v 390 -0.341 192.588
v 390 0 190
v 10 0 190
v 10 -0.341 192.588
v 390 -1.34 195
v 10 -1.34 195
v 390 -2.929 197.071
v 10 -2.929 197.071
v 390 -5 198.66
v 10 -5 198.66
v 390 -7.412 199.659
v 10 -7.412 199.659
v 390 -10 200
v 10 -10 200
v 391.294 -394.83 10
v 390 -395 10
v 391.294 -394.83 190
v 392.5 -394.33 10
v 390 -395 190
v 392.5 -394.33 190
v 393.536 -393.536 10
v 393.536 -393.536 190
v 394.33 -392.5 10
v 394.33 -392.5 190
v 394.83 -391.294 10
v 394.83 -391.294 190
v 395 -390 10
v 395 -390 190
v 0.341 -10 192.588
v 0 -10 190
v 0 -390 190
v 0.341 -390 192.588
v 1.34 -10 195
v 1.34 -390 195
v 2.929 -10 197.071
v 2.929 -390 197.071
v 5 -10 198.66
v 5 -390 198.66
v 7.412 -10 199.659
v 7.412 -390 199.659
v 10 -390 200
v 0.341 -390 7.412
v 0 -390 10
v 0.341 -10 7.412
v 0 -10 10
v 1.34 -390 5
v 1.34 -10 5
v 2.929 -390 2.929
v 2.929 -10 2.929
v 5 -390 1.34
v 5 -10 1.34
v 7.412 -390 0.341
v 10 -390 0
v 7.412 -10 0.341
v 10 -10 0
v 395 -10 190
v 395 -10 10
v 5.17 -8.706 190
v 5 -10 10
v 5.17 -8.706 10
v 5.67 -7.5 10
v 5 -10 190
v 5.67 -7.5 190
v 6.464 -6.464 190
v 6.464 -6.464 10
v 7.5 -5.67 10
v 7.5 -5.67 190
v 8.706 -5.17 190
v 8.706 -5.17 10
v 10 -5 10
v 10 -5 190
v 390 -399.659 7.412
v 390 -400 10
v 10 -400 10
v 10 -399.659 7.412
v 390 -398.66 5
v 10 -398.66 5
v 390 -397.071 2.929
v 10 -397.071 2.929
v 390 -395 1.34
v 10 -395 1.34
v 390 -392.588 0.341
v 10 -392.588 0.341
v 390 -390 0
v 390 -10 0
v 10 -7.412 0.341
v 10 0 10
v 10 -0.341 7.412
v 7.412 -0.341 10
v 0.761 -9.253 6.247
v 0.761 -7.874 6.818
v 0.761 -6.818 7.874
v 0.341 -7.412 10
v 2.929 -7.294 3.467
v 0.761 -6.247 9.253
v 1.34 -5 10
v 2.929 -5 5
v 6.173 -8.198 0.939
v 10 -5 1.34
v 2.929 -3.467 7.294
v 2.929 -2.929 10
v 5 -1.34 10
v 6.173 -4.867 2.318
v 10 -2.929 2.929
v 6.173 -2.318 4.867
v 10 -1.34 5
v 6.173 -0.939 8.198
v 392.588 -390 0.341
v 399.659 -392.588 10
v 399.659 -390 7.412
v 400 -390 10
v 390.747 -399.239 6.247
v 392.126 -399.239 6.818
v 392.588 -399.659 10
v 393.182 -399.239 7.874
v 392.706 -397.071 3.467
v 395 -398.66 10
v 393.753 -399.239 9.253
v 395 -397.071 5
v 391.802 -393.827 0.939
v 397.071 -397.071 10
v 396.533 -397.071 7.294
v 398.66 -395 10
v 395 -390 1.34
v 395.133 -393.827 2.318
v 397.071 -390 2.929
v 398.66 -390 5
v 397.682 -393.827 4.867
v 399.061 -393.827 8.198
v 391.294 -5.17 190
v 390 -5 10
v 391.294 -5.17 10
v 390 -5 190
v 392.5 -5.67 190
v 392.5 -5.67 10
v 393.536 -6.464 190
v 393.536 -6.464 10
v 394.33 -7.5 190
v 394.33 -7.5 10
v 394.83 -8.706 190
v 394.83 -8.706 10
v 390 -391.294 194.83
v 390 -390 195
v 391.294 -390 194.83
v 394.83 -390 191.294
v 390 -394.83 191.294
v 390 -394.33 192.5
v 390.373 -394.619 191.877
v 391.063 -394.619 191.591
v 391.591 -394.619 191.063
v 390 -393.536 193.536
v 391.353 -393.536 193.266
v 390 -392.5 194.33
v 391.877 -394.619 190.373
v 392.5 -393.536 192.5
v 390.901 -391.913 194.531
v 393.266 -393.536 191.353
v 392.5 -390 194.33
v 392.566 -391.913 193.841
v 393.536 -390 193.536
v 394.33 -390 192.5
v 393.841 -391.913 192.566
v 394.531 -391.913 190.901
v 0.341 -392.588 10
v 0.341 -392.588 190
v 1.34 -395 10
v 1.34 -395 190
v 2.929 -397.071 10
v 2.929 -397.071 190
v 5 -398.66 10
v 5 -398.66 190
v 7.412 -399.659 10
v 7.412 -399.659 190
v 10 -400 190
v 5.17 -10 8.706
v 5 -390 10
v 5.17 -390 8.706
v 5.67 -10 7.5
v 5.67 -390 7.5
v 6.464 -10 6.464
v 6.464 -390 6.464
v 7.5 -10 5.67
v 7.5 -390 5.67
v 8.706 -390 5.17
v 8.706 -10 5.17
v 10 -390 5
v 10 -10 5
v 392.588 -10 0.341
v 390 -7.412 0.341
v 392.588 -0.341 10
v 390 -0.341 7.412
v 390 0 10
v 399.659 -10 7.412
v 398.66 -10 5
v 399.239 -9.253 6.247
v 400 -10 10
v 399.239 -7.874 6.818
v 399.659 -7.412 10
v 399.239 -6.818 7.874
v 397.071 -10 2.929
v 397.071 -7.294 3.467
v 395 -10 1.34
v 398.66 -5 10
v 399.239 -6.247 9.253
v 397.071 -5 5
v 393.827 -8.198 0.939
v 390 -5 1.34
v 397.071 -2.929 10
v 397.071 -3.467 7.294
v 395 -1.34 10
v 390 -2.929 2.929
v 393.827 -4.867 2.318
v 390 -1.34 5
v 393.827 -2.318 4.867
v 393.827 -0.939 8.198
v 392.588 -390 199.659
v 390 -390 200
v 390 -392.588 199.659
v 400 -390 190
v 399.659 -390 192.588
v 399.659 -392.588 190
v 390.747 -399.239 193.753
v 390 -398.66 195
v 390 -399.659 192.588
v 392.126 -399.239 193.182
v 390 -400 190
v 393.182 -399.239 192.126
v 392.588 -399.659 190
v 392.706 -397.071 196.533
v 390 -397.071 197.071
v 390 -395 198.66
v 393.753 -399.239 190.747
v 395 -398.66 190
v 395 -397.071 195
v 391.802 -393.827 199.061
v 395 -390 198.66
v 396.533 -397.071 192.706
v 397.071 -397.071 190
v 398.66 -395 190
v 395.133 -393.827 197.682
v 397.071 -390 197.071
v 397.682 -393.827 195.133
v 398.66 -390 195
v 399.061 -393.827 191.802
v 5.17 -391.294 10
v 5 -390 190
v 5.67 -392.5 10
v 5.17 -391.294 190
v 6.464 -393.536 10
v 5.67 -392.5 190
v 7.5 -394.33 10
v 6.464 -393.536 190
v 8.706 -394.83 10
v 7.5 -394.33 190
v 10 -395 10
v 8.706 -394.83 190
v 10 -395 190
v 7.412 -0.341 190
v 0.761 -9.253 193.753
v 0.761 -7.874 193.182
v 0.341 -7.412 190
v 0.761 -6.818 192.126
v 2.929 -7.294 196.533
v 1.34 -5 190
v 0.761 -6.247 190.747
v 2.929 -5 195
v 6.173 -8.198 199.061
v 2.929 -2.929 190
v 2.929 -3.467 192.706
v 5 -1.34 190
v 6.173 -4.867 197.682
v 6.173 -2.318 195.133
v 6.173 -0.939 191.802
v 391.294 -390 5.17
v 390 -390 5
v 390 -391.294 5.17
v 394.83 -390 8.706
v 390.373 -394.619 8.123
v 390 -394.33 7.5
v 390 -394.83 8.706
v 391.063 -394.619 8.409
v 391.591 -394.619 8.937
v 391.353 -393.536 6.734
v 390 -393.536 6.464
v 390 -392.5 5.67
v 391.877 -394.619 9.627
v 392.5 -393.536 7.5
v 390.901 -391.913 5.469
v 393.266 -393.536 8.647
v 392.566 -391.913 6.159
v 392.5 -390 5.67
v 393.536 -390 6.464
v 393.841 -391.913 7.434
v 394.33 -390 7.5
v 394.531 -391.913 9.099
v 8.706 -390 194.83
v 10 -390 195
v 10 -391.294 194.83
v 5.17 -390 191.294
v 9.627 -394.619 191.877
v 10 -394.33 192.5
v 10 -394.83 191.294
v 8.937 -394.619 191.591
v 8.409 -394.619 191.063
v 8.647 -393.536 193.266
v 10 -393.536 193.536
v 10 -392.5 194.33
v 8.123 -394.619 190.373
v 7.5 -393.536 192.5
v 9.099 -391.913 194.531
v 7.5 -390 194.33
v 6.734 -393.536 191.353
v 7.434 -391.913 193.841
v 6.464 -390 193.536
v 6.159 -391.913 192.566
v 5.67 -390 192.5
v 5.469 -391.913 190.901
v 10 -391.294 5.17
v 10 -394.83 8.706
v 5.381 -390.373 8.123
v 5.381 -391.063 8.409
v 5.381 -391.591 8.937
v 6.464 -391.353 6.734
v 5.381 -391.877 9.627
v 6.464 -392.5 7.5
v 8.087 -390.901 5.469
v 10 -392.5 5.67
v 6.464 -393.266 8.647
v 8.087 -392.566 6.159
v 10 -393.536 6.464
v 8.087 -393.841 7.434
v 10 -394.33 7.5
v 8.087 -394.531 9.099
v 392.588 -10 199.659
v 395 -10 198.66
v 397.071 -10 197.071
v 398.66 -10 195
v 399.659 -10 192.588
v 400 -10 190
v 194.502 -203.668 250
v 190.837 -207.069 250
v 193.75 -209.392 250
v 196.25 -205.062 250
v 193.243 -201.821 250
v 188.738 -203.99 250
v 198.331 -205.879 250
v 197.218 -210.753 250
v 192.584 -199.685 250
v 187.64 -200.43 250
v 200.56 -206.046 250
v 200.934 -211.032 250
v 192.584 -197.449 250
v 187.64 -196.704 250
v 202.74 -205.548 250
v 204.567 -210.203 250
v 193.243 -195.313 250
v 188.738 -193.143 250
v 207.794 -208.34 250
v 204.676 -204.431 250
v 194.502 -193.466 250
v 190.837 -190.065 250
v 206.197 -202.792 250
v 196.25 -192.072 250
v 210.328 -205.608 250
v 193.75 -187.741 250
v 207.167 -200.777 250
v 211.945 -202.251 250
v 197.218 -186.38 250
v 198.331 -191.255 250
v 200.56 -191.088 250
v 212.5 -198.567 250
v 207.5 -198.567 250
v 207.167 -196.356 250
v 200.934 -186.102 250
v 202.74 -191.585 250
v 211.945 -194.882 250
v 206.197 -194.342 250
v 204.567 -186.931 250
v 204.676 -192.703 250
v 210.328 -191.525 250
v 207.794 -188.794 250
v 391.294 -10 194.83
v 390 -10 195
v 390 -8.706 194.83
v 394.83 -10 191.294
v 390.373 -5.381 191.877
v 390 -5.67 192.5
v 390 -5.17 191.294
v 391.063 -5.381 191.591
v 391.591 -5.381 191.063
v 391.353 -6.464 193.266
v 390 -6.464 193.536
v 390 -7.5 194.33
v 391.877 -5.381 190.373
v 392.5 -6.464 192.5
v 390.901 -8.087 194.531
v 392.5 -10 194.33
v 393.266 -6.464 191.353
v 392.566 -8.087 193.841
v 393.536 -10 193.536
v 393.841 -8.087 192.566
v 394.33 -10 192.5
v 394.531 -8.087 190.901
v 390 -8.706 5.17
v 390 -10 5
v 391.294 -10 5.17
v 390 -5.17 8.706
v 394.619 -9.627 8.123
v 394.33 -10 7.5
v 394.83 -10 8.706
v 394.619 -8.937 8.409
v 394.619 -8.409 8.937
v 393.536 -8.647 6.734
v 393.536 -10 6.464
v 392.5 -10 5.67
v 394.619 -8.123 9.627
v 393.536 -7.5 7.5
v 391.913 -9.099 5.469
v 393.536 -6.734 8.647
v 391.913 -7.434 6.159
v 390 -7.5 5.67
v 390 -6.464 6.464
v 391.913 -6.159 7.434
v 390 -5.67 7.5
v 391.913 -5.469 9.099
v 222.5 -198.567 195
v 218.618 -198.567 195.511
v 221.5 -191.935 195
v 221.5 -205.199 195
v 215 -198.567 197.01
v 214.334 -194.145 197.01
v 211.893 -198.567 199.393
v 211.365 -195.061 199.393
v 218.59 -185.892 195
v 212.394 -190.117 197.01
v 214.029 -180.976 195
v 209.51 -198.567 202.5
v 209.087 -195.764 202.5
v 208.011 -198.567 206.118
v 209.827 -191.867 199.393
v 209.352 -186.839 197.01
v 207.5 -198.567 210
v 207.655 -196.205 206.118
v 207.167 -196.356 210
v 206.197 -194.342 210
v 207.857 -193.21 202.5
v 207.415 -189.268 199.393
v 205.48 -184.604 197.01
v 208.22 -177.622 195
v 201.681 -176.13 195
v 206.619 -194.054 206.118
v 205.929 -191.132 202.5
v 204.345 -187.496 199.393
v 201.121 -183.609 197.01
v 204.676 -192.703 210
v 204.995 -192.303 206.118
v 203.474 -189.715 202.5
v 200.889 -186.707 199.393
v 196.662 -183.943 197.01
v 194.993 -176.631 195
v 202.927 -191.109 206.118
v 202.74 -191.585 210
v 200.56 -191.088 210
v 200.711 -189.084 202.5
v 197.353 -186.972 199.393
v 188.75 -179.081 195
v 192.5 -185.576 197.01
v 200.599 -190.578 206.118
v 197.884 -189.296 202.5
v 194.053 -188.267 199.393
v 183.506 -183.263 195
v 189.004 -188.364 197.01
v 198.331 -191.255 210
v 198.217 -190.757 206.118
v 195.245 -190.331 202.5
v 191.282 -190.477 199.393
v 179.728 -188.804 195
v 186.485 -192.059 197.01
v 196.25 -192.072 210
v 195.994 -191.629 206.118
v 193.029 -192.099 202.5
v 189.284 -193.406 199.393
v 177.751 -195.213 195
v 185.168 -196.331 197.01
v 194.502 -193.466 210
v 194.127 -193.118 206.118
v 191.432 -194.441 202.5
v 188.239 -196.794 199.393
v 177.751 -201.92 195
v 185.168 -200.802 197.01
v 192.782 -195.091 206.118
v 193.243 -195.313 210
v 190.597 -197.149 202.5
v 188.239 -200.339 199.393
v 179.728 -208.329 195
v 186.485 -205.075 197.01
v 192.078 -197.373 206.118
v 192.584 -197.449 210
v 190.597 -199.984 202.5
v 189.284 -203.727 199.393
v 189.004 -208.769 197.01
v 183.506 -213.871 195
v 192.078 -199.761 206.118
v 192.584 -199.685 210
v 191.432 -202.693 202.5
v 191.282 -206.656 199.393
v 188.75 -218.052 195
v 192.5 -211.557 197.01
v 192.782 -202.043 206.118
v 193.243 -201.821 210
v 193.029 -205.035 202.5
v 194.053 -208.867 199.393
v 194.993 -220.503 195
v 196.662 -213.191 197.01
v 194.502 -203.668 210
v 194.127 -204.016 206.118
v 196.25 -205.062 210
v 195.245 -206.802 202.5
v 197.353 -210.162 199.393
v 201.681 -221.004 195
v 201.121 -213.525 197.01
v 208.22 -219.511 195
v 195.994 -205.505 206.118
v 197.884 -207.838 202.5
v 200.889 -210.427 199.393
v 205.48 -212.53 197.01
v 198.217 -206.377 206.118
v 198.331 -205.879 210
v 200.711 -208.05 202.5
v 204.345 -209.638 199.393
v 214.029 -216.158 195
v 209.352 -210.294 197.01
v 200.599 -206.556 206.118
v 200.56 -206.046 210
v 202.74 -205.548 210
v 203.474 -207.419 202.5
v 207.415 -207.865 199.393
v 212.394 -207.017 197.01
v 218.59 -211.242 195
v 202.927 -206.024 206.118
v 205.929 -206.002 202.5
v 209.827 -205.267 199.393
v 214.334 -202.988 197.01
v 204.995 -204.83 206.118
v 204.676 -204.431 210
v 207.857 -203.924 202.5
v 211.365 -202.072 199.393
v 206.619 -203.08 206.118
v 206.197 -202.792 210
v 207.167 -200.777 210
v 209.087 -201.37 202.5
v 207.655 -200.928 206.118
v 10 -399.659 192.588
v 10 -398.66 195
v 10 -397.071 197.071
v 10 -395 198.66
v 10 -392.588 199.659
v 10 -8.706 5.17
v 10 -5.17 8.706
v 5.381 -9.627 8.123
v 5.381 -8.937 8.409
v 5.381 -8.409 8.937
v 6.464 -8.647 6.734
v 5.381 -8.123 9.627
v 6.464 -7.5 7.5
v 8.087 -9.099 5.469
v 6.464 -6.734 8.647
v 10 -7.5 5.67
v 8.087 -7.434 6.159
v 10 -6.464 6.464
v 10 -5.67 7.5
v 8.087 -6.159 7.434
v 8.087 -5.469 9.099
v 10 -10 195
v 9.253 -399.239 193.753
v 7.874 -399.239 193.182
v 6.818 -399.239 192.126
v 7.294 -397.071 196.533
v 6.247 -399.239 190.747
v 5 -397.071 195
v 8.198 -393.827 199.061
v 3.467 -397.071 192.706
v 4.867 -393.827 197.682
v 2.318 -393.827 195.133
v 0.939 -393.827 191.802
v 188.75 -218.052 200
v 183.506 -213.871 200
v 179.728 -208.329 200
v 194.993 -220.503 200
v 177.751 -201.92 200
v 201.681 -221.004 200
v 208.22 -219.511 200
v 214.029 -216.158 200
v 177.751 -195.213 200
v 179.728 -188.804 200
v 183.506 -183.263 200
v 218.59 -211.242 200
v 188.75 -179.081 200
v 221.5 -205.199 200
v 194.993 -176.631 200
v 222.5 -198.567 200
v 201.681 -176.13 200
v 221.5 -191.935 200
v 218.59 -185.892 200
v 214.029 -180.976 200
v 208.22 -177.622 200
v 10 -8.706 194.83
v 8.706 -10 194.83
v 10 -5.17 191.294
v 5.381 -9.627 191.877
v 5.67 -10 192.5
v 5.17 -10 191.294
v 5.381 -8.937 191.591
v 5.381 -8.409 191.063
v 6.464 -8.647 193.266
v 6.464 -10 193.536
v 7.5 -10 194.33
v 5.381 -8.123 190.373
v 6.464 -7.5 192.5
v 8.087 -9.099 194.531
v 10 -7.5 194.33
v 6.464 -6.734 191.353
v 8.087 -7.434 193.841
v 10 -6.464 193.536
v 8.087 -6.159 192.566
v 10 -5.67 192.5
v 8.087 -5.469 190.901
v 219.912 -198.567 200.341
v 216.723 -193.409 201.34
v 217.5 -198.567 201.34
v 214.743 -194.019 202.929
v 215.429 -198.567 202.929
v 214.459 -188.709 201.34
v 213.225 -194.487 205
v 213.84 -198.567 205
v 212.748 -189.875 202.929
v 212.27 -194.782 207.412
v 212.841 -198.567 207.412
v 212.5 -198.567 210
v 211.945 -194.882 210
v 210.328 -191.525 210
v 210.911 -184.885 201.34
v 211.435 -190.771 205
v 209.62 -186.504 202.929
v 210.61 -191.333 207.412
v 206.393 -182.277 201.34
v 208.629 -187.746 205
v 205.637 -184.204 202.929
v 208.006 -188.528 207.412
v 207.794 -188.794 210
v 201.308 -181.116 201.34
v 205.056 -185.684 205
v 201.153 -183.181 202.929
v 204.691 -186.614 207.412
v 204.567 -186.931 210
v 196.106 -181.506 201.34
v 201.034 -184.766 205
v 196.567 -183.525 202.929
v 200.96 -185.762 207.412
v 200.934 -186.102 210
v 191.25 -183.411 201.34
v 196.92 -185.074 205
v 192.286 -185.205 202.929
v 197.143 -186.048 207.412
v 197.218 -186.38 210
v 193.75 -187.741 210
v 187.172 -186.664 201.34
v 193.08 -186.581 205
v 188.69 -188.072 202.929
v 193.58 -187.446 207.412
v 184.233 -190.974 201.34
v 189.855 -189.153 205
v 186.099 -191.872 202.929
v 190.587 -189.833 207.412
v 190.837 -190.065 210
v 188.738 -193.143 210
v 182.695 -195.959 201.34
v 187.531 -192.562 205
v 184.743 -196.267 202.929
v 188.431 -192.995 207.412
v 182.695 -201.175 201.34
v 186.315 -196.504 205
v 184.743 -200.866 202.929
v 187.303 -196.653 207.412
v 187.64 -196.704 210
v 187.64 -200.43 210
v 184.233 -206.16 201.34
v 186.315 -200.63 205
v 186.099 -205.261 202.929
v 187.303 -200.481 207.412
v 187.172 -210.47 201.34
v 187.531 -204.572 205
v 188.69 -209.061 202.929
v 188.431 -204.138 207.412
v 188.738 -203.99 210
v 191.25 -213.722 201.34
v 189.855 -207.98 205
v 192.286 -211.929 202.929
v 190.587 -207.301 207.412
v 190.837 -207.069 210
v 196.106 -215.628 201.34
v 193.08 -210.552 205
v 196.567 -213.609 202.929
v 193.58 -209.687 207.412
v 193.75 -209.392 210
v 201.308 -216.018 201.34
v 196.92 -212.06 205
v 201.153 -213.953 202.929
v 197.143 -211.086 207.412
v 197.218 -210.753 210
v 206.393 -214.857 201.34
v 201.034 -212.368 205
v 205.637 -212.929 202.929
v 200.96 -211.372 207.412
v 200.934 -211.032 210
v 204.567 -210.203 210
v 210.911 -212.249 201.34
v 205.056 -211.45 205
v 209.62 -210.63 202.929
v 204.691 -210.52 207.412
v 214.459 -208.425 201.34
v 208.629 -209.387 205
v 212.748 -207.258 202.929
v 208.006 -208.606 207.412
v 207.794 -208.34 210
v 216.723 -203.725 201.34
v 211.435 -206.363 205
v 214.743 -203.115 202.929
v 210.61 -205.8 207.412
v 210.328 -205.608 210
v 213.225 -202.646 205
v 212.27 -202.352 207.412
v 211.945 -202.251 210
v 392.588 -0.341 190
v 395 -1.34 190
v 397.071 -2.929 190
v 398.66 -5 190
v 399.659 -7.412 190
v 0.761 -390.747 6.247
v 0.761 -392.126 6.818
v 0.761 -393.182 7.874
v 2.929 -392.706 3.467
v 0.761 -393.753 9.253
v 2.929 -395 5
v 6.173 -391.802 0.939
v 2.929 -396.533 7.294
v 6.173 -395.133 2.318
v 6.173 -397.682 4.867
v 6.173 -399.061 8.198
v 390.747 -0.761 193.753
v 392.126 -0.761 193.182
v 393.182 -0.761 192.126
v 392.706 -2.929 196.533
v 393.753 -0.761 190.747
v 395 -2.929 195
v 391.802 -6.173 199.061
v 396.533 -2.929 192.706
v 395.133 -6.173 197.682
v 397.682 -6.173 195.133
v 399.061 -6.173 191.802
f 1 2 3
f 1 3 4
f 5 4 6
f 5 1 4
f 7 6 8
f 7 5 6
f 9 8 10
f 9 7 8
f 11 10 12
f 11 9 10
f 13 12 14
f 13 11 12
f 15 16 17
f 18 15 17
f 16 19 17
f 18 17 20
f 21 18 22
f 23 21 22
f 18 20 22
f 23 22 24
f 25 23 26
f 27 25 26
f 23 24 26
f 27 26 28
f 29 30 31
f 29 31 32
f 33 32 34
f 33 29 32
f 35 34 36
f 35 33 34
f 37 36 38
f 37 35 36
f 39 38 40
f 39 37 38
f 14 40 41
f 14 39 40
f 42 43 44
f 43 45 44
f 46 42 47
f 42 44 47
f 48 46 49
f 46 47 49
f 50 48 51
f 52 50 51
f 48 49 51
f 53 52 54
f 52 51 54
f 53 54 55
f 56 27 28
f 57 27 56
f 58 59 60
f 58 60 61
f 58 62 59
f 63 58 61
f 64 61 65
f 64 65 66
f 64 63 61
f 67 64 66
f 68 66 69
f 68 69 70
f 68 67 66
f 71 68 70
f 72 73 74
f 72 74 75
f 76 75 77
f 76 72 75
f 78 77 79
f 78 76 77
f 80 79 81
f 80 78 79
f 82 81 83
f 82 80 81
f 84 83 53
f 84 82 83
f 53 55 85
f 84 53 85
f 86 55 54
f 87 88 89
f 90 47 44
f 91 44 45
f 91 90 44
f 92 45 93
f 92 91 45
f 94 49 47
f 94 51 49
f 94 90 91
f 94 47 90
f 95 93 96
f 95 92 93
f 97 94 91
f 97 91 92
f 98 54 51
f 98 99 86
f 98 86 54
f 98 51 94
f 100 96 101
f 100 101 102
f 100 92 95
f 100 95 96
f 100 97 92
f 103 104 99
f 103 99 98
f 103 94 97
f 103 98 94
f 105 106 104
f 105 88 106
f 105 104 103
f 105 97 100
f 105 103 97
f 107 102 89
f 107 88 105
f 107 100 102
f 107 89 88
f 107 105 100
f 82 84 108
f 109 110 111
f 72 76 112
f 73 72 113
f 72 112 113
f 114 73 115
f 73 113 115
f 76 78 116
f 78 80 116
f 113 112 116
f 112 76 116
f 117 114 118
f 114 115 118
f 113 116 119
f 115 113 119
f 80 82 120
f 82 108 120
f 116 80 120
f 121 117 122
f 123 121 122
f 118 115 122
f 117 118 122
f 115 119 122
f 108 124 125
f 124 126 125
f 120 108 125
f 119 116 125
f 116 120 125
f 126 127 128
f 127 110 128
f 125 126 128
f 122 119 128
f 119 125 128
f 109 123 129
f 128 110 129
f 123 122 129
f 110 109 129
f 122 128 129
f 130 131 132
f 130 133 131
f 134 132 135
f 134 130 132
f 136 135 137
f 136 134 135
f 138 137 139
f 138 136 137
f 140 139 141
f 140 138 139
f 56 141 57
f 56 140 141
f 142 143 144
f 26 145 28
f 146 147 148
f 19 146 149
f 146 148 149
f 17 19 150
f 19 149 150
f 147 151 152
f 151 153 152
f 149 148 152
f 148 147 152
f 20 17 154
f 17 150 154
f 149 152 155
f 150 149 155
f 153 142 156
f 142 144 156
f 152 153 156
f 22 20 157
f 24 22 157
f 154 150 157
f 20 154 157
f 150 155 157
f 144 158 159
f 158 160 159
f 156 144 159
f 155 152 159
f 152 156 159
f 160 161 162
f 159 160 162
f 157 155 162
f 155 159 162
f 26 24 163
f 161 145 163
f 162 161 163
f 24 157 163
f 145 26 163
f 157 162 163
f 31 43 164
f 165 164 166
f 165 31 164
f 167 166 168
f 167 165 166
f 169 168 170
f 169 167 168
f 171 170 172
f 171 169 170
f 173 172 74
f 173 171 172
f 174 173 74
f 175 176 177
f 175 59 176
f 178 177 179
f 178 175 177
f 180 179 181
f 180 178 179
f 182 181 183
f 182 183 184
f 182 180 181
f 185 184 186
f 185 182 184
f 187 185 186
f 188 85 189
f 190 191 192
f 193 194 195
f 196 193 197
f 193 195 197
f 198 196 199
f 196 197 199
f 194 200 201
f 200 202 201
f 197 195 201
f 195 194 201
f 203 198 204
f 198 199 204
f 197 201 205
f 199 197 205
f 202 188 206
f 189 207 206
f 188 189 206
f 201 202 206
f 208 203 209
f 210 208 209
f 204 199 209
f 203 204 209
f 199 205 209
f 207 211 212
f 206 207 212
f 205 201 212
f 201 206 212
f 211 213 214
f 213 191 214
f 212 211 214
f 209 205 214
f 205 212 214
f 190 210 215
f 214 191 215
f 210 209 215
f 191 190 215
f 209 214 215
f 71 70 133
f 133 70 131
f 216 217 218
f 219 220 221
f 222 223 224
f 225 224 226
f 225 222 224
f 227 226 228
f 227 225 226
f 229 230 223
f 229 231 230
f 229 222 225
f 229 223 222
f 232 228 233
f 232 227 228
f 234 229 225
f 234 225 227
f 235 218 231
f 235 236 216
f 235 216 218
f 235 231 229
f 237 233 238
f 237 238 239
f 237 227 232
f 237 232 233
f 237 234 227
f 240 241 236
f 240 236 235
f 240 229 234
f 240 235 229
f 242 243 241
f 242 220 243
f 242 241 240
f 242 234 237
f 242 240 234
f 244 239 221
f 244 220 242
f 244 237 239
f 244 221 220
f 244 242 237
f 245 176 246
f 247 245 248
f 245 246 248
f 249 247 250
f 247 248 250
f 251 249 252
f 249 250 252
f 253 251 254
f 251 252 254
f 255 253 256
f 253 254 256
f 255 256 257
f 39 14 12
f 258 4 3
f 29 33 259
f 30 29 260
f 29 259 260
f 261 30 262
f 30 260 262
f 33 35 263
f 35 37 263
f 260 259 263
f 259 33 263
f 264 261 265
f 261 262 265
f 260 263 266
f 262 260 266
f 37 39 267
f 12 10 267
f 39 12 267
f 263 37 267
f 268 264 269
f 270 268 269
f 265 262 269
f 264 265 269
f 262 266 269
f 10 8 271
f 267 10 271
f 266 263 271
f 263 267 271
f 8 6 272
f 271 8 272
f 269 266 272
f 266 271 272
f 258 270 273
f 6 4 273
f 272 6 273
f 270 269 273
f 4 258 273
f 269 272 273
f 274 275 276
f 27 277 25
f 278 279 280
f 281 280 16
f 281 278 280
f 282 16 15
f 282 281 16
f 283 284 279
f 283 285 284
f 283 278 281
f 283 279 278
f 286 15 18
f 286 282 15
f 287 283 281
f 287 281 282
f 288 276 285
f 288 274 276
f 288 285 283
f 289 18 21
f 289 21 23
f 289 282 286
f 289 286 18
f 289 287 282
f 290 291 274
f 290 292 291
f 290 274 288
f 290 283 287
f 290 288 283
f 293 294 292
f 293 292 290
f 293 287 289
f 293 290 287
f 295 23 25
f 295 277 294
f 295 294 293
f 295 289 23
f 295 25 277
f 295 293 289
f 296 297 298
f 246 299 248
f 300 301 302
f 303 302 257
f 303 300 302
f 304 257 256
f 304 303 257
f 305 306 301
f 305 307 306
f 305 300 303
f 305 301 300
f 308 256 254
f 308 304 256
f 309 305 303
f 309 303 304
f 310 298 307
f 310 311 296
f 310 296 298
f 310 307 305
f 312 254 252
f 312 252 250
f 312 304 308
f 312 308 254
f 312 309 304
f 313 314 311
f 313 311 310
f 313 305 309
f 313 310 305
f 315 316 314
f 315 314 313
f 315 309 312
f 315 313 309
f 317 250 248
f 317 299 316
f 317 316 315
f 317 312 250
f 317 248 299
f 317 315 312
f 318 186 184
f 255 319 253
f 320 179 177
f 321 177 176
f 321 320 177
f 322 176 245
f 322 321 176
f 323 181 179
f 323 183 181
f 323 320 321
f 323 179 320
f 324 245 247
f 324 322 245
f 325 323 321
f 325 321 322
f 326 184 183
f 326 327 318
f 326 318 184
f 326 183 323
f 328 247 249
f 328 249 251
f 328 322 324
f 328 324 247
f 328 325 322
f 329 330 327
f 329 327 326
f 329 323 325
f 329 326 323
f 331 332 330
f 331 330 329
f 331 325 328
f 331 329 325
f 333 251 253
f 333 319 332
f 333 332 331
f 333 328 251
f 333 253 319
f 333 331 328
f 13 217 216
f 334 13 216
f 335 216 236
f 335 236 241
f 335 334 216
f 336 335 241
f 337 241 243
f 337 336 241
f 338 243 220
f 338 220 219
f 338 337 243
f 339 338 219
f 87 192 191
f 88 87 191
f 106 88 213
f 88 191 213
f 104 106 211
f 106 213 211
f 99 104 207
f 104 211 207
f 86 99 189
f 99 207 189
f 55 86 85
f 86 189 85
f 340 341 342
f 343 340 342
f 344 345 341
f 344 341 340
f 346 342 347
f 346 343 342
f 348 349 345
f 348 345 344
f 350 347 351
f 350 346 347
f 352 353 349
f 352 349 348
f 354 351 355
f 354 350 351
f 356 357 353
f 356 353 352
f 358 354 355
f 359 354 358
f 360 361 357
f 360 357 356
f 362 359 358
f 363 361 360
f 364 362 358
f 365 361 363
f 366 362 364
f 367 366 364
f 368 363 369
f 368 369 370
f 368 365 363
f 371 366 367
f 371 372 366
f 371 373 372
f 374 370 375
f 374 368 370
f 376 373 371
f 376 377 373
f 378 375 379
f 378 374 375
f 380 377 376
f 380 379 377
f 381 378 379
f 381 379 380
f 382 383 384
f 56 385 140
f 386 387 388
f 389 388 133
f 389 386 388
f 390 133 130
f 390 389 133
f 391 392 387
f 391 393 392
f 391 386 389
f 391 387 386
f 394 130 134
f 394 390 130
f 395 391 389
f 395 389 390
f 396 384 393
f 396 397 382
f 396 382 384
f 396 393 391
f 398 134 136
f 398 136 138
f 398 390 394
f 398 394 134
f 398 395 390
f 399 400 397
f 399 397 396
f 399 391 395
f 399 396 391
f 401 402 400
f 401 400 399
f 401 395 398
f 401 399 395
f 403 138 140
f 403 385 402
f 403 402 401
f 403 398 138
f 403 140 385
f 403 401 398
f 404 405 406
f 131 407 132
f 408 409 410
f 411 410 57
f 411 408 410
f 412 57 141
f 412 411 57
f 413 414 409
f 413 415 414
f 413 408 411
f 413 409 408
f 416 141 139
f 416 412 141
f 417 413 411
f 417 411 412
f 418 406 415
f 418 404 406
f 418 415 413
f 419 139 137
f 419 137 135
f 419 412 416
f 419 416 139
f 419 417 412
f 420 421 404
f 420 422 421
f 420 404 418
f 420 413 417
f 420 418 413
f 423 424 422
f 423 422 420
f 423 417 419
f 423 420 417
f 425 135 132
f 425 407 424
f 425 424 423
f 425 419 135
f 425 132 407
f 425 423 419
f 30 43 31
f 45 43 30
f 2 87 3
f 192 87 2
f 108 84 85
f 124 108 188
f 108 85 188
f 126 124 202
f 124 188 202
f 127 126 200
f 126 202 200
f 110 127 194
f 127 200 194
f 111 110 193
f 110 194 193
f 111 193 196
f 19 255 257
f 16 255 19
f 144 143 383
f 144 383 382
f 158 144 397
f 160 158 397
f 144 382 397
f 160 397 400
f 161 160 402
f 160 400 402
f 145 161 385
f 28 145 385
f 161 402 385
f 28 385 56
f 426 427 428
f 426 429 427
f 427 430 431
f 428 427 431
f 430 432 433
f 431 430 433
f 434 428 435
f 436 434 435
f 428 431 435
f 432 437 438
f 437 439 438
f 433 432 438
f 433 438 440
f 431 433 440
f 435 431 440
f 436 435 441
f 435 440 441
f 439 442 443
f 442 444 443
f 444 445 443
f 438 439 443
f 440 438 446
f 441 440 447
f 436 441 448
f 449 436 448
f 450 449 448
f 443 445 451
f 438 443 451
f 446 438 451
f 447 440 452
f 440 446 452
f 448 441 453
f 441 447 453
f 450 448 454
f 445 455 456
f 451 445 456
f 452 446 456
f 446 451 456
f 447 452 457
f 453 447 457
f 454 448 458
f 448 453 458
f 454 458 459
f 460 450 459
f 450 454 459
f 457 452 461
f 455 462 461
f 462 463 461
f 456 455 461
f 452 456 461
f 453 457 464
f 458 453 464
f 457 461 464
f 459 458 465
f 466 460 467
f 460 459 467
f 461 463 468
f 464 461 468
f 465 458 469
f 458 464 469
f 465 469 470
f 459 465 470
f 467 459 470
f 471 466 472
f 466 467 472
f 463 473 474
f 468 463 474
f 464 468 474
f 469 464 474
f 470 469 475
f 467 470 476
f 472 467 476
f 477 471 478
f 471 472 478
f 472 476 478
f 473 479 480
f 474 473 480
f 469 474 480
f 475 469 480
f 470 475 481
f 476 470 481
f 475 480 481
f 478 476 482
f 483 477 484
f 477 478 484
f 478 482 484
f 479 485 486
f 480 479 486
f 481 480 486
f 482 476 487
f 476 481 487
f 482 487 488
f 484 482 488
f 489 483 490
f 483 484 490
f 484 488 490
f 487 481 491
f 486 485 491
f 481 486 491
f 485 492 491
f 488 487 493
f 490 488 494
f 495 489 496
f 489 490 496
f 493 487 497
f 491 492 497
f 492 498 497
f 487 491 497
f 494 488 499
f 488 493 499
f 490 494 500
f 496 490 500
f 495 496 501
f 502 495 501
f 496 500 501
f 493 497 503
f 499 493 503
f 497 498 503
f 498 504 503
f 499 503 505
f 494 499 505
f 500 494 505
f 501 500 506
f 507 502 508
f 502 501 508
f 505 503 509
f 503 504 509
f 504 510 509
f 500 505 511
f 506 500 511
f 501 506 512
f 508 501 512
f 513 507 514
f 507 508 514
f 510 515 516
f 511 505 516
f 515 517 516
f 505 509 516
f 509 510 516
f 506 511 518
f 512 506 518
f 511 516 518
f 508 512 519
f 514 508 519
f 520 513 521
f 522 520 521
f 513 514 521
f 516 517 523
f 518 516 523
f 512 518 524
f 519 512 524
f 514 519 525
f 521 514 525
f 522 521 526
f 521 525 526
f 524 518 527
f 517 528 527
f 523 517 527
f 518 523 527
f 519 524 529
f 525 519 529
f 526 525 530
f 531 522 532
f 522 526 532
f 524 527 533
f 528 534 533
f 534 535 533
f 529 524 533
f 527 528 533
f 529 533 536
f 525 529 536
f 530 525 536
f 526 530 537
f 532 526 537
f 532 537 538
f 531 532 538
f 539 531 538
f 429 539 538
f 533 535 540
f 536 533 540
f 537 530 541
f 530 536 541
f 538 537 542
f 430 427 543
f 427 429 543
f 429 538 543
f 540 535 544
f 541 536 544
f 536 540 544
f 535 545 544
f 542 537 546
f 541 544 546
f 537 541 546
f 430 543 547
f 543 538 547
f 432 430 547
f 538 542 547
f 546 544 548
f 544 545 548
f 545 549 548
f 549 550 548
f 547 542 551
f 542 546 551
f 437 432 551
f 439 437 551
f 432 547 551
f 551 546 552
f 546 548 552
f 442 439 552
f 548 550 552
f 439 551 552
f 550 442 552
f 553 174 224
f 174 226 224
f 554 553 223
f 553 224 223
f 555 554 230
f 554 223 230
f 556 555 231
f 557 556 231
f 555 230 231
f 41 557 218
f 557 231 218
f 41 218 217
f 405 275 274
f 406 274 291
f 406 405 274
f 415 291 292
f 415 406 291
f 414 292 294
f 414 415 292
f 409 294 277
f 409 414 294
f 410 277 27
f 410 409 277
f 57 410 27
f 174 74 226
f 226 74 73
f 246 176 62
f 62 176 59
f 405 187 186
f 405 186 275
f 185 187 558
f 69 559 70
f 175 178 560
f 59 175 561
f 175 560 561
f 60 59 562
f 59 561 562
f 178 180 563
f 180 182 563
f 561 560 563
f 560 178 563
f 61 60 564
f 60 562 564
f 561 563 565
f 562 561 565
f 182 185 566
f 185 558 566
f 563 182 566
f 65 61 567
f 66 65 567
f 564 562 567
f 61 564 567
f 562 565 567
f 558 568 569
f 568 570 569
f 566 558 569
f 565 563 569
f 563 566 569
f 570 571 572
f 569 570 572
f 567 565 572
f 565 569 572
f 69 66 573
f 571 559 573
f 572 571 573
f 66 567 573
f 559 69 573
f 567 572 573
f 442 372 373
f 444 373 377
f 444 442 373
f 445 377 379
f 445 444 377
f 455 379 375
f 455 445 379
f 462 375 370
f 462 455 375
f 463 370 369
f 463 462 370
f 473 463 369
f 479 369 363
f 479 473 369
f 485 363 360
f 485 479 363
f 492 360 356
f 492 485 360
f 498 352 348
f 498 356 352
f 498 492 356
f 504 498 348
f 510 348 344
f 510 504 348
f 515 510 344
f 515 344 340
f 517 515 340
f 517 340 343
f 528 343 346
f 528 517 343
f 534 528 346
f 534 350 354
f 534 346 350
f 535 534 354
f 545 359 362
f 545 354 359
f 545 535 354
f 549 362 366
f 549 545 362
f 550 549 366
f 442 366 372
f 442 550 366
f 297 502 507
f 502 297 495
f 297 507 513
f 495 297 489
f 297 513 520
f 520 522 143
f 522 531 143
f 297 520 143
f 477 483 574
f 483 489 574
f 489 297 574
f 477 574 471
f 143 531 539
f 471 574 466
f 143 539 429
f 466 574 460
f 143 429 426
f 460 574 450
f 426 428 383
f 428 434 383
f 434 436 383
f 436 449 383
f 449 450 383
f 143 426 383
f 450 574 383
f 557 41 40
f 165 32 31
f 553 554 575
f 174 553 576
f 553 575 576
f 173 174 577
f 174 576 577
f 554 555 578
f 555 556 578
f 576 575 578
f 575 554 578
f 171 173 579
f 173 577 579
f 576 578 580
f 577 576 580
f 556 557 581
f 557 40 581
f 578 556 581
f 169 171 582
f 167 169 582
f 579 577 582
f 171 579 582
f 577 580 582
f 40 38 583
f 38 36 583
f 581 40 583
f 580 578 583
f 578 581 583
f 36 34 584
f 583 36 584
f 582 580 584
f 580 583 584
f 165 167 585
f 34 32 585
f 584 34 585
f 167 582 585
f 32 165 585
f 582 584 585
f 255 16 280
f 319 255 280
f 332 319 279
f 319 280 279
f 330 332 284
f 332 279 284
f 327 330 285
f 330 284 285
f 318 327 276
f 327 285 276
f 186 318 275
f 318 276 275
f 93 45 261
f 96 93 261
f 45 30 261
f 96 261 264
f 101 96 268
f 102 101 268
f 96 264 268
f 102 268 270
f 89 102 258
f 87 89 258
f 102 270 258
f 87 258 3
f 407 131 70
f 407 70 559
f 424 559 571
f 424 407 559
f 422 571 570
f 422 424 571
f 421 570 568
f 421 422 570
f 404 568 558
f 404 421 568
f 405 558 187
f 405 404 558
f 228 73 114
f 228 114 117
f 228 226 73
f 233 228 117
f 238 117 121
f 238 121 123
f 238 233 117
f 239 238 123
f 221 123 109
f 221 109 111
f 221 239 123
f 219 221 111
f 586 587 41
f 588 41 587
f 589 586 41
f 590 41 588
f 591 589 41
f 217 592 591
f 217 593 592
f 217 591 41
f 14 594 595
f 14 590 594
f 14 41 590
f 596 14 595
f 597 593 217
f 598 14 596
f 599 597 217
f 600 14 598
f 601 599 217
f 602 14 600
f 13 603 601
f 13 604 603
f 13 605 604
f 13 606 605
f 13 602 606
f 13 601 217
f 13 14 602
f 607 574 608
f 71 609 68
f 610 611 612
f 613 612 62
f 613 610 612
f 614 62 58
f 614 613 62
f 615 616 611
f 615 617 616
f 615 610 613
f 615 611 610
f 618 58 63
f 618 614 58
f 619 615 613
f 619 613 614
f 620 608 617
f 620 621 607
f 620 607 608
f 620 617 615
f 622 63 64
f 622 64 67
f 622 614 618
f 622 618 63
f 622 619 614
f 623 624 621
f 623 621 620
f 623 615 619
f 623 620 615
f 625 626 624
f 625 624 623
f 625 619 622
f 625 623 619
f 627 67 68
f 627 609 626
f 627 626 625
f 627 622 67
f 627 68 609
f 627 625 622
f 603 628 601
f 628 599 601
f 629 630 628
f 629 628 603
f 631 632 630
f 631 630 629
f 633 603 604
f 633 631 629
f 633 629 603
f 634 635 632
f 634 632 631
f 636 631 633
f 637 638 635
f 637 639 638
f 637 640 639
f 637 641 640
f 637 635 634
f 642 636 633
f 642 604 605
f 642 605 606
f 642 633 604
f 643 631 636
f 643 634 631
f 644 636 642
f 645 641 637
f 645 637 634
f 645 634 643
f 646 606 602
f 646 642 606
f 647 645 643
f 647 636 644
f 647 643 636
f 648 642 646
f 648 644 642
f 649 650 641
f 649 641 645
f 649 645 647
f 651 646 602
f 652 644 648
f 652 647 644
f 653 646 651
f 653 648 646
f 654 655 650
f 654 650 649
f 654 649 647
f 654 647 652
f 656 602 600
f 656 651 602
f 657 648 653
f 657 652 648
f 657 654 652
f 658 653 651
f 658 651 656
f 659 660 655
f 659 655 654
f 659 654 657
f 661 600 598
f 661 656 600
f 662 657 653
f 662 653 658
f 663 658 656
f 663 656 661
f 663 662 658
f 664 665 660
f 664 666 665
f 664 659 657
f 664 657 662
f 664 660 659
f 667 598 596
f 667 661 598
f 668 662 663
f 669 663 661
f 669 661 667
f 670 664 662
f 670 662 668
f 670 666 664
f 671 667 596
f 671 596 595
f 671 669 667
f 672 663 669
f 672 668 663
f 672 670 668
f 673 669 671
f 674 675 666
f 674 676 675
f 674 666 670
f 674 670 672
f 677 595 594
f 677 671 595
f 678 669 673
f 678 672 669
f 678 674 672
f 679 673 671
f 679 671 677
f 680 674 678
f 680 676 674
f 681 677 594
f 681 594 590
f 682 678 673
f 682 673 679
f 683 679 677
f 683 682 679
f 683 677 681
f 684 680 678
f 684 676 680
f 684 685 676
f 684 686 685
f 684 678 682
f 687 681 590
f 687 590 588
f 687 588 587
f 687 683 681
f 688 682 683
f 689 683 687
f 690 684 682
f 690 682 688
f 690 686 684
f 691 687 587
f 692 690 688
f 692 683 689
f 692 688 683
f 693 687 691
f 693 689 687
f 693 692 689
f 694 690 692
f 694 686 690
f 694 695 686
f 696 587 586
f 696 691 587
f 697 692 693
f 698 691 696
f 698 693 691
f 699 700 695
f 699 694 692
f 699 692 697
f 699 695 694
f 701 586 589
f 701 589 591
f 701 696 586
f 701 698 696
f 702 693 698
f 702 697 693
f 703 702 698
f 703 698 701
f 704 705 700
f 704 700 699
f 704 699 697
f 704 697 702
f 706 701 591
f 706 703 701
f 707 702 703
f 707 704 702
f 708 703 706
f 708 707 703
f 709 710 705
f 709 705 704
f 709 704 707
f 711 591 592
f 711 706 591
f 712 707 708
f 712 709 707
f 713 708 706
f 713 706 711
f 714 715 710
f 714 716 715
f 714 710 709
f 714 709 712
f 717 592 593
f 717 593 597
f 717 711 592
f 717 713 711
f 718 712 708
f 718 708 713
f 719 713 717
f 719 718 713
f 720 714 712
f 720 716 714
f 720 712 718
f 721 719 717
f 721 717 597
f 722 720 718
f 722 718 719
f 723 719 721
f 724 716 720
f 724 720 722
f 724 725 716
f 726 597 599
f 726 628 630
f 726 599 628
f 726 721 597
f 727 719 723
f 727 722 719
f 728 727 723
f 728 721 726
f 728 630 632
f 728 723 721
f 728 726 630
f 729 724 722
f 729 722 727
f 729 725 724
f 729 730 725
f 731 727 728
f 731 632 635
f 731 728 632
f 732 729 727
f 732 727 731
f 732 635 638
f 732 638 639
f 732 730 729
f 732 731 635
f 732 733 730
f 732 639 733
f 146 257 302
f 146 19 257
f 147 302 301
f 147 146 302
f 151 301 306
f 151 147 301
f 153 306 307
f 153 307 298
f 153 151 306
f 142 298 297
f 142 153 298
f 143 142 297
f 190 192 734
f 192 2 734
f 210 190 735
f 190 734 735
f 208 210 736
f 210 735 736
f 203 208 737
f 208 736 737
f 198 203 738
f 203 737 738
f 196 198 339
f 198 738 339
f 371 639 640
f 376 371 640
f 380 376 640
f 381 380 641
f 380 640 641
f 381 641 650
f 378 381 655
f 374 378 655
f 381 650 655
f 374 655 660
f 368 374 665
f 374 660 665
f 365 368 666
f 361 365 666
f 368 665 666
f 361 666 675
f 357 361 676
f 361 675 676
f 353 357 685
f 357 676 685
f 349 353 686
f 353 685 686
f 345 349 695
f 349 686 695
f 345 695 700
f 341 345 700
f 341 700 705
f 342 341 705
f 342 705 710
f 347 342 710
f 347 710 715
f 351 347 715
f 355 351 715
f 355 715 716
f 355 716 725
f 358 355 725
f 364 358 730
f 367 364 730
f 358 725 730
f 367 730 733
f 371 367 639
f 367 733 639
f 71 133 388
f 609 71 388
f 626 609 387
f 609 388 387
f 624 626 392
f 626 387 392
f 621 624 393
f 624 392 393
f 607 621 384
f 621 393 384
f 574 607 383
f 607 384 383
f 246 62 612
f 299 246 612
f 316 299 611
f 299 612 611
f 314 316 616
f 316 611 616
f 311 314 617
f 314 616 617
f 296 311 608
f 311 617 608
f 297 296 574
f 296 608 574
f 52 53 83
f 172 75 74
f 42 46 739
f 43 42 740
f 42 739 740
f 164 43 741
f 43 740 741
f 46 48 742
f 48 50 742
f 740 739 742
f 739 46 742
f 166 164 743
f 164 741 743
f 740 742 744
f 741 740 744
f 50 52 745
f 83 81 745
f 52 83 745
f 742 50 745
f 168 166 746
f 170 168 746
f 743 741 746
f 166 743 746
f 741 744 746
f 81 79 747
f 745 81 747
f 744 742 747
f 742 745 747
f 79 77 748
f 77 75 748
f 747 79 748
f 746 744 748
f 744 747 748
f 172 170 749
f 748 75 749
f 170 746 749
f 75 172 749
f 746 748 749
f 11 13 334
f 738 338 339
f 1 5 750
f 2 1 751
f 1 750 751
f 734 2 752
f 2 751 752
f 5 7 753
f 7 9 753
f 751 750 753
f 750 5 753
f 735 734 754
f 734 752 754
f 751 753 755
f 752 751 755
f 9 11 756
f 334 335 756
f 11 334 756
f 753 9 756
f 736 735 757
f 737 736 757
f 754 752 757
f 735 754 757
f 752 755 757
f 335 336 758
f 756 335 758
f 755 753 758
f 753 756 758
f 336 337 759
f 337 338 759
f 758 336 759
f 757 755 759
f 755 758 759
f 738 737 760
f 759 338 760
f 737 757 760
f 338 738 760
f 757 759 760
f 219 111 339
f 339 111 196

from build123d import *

# Parameters (mm, degrees)
SKETCH_1_W      = 400
SKETCH_1_H      = 400
EXTRUDE_1_DEPTH = 200
SKETCH_2_R      = 12.5
EXTRUDE_2_DEPTH = 50
FILLET_1_R      = 10
SHELL_1_T       = -5


with BuildPart() as part:
    # 스케치1 → 보스-돌출1 (new body)
    with BuildSketch(Plane.XY):
        with Locations((200, -200)):
            Rectangle(SKETCH_1_W, SKETCH_1_H)
    extrude(amount=EXTRUDE_1_DEPTH)

    # 스케치2 → 보스-돌출2 (add)
    with BuildSketch(Plane.XY.offset(200)):
        with Locations((200, -198.566815637)):
            Circle(SKETCH_2_R)
    extrude(amount=EXTRUDE_2_DEPTH)

    # 필렛1
    fillet_1_edges = [part.edges().sort_by_distance(p)[0] for p in [
        (400, -200, 200),
        (200, 0, 200),
        (187.5, -198.566815637, 200),
        (0, -200, 200),
        (200, 0, 0),
        (400, -200, 0),
        (200, -400, 0),
        (0, -200, 0),
        (200, -400, 200),
        (0, 0, 100),
        (400, 0, 100),
        (400, -400, 100),
        (0, -400, 100),
    ]]
    fillet(fillet_1_edges, radius=FILLET_1_R)

    # 쉘1
    shell_1_openings = [part.faces().sort_by_distance(p)[0] for p in [
        (200, -198.566815637, 250),
    ]]
    offset(amount=SHELL_1_T, openings=shell_1_openings, kind=Kind.INTERSECTION)


solid = part.part
